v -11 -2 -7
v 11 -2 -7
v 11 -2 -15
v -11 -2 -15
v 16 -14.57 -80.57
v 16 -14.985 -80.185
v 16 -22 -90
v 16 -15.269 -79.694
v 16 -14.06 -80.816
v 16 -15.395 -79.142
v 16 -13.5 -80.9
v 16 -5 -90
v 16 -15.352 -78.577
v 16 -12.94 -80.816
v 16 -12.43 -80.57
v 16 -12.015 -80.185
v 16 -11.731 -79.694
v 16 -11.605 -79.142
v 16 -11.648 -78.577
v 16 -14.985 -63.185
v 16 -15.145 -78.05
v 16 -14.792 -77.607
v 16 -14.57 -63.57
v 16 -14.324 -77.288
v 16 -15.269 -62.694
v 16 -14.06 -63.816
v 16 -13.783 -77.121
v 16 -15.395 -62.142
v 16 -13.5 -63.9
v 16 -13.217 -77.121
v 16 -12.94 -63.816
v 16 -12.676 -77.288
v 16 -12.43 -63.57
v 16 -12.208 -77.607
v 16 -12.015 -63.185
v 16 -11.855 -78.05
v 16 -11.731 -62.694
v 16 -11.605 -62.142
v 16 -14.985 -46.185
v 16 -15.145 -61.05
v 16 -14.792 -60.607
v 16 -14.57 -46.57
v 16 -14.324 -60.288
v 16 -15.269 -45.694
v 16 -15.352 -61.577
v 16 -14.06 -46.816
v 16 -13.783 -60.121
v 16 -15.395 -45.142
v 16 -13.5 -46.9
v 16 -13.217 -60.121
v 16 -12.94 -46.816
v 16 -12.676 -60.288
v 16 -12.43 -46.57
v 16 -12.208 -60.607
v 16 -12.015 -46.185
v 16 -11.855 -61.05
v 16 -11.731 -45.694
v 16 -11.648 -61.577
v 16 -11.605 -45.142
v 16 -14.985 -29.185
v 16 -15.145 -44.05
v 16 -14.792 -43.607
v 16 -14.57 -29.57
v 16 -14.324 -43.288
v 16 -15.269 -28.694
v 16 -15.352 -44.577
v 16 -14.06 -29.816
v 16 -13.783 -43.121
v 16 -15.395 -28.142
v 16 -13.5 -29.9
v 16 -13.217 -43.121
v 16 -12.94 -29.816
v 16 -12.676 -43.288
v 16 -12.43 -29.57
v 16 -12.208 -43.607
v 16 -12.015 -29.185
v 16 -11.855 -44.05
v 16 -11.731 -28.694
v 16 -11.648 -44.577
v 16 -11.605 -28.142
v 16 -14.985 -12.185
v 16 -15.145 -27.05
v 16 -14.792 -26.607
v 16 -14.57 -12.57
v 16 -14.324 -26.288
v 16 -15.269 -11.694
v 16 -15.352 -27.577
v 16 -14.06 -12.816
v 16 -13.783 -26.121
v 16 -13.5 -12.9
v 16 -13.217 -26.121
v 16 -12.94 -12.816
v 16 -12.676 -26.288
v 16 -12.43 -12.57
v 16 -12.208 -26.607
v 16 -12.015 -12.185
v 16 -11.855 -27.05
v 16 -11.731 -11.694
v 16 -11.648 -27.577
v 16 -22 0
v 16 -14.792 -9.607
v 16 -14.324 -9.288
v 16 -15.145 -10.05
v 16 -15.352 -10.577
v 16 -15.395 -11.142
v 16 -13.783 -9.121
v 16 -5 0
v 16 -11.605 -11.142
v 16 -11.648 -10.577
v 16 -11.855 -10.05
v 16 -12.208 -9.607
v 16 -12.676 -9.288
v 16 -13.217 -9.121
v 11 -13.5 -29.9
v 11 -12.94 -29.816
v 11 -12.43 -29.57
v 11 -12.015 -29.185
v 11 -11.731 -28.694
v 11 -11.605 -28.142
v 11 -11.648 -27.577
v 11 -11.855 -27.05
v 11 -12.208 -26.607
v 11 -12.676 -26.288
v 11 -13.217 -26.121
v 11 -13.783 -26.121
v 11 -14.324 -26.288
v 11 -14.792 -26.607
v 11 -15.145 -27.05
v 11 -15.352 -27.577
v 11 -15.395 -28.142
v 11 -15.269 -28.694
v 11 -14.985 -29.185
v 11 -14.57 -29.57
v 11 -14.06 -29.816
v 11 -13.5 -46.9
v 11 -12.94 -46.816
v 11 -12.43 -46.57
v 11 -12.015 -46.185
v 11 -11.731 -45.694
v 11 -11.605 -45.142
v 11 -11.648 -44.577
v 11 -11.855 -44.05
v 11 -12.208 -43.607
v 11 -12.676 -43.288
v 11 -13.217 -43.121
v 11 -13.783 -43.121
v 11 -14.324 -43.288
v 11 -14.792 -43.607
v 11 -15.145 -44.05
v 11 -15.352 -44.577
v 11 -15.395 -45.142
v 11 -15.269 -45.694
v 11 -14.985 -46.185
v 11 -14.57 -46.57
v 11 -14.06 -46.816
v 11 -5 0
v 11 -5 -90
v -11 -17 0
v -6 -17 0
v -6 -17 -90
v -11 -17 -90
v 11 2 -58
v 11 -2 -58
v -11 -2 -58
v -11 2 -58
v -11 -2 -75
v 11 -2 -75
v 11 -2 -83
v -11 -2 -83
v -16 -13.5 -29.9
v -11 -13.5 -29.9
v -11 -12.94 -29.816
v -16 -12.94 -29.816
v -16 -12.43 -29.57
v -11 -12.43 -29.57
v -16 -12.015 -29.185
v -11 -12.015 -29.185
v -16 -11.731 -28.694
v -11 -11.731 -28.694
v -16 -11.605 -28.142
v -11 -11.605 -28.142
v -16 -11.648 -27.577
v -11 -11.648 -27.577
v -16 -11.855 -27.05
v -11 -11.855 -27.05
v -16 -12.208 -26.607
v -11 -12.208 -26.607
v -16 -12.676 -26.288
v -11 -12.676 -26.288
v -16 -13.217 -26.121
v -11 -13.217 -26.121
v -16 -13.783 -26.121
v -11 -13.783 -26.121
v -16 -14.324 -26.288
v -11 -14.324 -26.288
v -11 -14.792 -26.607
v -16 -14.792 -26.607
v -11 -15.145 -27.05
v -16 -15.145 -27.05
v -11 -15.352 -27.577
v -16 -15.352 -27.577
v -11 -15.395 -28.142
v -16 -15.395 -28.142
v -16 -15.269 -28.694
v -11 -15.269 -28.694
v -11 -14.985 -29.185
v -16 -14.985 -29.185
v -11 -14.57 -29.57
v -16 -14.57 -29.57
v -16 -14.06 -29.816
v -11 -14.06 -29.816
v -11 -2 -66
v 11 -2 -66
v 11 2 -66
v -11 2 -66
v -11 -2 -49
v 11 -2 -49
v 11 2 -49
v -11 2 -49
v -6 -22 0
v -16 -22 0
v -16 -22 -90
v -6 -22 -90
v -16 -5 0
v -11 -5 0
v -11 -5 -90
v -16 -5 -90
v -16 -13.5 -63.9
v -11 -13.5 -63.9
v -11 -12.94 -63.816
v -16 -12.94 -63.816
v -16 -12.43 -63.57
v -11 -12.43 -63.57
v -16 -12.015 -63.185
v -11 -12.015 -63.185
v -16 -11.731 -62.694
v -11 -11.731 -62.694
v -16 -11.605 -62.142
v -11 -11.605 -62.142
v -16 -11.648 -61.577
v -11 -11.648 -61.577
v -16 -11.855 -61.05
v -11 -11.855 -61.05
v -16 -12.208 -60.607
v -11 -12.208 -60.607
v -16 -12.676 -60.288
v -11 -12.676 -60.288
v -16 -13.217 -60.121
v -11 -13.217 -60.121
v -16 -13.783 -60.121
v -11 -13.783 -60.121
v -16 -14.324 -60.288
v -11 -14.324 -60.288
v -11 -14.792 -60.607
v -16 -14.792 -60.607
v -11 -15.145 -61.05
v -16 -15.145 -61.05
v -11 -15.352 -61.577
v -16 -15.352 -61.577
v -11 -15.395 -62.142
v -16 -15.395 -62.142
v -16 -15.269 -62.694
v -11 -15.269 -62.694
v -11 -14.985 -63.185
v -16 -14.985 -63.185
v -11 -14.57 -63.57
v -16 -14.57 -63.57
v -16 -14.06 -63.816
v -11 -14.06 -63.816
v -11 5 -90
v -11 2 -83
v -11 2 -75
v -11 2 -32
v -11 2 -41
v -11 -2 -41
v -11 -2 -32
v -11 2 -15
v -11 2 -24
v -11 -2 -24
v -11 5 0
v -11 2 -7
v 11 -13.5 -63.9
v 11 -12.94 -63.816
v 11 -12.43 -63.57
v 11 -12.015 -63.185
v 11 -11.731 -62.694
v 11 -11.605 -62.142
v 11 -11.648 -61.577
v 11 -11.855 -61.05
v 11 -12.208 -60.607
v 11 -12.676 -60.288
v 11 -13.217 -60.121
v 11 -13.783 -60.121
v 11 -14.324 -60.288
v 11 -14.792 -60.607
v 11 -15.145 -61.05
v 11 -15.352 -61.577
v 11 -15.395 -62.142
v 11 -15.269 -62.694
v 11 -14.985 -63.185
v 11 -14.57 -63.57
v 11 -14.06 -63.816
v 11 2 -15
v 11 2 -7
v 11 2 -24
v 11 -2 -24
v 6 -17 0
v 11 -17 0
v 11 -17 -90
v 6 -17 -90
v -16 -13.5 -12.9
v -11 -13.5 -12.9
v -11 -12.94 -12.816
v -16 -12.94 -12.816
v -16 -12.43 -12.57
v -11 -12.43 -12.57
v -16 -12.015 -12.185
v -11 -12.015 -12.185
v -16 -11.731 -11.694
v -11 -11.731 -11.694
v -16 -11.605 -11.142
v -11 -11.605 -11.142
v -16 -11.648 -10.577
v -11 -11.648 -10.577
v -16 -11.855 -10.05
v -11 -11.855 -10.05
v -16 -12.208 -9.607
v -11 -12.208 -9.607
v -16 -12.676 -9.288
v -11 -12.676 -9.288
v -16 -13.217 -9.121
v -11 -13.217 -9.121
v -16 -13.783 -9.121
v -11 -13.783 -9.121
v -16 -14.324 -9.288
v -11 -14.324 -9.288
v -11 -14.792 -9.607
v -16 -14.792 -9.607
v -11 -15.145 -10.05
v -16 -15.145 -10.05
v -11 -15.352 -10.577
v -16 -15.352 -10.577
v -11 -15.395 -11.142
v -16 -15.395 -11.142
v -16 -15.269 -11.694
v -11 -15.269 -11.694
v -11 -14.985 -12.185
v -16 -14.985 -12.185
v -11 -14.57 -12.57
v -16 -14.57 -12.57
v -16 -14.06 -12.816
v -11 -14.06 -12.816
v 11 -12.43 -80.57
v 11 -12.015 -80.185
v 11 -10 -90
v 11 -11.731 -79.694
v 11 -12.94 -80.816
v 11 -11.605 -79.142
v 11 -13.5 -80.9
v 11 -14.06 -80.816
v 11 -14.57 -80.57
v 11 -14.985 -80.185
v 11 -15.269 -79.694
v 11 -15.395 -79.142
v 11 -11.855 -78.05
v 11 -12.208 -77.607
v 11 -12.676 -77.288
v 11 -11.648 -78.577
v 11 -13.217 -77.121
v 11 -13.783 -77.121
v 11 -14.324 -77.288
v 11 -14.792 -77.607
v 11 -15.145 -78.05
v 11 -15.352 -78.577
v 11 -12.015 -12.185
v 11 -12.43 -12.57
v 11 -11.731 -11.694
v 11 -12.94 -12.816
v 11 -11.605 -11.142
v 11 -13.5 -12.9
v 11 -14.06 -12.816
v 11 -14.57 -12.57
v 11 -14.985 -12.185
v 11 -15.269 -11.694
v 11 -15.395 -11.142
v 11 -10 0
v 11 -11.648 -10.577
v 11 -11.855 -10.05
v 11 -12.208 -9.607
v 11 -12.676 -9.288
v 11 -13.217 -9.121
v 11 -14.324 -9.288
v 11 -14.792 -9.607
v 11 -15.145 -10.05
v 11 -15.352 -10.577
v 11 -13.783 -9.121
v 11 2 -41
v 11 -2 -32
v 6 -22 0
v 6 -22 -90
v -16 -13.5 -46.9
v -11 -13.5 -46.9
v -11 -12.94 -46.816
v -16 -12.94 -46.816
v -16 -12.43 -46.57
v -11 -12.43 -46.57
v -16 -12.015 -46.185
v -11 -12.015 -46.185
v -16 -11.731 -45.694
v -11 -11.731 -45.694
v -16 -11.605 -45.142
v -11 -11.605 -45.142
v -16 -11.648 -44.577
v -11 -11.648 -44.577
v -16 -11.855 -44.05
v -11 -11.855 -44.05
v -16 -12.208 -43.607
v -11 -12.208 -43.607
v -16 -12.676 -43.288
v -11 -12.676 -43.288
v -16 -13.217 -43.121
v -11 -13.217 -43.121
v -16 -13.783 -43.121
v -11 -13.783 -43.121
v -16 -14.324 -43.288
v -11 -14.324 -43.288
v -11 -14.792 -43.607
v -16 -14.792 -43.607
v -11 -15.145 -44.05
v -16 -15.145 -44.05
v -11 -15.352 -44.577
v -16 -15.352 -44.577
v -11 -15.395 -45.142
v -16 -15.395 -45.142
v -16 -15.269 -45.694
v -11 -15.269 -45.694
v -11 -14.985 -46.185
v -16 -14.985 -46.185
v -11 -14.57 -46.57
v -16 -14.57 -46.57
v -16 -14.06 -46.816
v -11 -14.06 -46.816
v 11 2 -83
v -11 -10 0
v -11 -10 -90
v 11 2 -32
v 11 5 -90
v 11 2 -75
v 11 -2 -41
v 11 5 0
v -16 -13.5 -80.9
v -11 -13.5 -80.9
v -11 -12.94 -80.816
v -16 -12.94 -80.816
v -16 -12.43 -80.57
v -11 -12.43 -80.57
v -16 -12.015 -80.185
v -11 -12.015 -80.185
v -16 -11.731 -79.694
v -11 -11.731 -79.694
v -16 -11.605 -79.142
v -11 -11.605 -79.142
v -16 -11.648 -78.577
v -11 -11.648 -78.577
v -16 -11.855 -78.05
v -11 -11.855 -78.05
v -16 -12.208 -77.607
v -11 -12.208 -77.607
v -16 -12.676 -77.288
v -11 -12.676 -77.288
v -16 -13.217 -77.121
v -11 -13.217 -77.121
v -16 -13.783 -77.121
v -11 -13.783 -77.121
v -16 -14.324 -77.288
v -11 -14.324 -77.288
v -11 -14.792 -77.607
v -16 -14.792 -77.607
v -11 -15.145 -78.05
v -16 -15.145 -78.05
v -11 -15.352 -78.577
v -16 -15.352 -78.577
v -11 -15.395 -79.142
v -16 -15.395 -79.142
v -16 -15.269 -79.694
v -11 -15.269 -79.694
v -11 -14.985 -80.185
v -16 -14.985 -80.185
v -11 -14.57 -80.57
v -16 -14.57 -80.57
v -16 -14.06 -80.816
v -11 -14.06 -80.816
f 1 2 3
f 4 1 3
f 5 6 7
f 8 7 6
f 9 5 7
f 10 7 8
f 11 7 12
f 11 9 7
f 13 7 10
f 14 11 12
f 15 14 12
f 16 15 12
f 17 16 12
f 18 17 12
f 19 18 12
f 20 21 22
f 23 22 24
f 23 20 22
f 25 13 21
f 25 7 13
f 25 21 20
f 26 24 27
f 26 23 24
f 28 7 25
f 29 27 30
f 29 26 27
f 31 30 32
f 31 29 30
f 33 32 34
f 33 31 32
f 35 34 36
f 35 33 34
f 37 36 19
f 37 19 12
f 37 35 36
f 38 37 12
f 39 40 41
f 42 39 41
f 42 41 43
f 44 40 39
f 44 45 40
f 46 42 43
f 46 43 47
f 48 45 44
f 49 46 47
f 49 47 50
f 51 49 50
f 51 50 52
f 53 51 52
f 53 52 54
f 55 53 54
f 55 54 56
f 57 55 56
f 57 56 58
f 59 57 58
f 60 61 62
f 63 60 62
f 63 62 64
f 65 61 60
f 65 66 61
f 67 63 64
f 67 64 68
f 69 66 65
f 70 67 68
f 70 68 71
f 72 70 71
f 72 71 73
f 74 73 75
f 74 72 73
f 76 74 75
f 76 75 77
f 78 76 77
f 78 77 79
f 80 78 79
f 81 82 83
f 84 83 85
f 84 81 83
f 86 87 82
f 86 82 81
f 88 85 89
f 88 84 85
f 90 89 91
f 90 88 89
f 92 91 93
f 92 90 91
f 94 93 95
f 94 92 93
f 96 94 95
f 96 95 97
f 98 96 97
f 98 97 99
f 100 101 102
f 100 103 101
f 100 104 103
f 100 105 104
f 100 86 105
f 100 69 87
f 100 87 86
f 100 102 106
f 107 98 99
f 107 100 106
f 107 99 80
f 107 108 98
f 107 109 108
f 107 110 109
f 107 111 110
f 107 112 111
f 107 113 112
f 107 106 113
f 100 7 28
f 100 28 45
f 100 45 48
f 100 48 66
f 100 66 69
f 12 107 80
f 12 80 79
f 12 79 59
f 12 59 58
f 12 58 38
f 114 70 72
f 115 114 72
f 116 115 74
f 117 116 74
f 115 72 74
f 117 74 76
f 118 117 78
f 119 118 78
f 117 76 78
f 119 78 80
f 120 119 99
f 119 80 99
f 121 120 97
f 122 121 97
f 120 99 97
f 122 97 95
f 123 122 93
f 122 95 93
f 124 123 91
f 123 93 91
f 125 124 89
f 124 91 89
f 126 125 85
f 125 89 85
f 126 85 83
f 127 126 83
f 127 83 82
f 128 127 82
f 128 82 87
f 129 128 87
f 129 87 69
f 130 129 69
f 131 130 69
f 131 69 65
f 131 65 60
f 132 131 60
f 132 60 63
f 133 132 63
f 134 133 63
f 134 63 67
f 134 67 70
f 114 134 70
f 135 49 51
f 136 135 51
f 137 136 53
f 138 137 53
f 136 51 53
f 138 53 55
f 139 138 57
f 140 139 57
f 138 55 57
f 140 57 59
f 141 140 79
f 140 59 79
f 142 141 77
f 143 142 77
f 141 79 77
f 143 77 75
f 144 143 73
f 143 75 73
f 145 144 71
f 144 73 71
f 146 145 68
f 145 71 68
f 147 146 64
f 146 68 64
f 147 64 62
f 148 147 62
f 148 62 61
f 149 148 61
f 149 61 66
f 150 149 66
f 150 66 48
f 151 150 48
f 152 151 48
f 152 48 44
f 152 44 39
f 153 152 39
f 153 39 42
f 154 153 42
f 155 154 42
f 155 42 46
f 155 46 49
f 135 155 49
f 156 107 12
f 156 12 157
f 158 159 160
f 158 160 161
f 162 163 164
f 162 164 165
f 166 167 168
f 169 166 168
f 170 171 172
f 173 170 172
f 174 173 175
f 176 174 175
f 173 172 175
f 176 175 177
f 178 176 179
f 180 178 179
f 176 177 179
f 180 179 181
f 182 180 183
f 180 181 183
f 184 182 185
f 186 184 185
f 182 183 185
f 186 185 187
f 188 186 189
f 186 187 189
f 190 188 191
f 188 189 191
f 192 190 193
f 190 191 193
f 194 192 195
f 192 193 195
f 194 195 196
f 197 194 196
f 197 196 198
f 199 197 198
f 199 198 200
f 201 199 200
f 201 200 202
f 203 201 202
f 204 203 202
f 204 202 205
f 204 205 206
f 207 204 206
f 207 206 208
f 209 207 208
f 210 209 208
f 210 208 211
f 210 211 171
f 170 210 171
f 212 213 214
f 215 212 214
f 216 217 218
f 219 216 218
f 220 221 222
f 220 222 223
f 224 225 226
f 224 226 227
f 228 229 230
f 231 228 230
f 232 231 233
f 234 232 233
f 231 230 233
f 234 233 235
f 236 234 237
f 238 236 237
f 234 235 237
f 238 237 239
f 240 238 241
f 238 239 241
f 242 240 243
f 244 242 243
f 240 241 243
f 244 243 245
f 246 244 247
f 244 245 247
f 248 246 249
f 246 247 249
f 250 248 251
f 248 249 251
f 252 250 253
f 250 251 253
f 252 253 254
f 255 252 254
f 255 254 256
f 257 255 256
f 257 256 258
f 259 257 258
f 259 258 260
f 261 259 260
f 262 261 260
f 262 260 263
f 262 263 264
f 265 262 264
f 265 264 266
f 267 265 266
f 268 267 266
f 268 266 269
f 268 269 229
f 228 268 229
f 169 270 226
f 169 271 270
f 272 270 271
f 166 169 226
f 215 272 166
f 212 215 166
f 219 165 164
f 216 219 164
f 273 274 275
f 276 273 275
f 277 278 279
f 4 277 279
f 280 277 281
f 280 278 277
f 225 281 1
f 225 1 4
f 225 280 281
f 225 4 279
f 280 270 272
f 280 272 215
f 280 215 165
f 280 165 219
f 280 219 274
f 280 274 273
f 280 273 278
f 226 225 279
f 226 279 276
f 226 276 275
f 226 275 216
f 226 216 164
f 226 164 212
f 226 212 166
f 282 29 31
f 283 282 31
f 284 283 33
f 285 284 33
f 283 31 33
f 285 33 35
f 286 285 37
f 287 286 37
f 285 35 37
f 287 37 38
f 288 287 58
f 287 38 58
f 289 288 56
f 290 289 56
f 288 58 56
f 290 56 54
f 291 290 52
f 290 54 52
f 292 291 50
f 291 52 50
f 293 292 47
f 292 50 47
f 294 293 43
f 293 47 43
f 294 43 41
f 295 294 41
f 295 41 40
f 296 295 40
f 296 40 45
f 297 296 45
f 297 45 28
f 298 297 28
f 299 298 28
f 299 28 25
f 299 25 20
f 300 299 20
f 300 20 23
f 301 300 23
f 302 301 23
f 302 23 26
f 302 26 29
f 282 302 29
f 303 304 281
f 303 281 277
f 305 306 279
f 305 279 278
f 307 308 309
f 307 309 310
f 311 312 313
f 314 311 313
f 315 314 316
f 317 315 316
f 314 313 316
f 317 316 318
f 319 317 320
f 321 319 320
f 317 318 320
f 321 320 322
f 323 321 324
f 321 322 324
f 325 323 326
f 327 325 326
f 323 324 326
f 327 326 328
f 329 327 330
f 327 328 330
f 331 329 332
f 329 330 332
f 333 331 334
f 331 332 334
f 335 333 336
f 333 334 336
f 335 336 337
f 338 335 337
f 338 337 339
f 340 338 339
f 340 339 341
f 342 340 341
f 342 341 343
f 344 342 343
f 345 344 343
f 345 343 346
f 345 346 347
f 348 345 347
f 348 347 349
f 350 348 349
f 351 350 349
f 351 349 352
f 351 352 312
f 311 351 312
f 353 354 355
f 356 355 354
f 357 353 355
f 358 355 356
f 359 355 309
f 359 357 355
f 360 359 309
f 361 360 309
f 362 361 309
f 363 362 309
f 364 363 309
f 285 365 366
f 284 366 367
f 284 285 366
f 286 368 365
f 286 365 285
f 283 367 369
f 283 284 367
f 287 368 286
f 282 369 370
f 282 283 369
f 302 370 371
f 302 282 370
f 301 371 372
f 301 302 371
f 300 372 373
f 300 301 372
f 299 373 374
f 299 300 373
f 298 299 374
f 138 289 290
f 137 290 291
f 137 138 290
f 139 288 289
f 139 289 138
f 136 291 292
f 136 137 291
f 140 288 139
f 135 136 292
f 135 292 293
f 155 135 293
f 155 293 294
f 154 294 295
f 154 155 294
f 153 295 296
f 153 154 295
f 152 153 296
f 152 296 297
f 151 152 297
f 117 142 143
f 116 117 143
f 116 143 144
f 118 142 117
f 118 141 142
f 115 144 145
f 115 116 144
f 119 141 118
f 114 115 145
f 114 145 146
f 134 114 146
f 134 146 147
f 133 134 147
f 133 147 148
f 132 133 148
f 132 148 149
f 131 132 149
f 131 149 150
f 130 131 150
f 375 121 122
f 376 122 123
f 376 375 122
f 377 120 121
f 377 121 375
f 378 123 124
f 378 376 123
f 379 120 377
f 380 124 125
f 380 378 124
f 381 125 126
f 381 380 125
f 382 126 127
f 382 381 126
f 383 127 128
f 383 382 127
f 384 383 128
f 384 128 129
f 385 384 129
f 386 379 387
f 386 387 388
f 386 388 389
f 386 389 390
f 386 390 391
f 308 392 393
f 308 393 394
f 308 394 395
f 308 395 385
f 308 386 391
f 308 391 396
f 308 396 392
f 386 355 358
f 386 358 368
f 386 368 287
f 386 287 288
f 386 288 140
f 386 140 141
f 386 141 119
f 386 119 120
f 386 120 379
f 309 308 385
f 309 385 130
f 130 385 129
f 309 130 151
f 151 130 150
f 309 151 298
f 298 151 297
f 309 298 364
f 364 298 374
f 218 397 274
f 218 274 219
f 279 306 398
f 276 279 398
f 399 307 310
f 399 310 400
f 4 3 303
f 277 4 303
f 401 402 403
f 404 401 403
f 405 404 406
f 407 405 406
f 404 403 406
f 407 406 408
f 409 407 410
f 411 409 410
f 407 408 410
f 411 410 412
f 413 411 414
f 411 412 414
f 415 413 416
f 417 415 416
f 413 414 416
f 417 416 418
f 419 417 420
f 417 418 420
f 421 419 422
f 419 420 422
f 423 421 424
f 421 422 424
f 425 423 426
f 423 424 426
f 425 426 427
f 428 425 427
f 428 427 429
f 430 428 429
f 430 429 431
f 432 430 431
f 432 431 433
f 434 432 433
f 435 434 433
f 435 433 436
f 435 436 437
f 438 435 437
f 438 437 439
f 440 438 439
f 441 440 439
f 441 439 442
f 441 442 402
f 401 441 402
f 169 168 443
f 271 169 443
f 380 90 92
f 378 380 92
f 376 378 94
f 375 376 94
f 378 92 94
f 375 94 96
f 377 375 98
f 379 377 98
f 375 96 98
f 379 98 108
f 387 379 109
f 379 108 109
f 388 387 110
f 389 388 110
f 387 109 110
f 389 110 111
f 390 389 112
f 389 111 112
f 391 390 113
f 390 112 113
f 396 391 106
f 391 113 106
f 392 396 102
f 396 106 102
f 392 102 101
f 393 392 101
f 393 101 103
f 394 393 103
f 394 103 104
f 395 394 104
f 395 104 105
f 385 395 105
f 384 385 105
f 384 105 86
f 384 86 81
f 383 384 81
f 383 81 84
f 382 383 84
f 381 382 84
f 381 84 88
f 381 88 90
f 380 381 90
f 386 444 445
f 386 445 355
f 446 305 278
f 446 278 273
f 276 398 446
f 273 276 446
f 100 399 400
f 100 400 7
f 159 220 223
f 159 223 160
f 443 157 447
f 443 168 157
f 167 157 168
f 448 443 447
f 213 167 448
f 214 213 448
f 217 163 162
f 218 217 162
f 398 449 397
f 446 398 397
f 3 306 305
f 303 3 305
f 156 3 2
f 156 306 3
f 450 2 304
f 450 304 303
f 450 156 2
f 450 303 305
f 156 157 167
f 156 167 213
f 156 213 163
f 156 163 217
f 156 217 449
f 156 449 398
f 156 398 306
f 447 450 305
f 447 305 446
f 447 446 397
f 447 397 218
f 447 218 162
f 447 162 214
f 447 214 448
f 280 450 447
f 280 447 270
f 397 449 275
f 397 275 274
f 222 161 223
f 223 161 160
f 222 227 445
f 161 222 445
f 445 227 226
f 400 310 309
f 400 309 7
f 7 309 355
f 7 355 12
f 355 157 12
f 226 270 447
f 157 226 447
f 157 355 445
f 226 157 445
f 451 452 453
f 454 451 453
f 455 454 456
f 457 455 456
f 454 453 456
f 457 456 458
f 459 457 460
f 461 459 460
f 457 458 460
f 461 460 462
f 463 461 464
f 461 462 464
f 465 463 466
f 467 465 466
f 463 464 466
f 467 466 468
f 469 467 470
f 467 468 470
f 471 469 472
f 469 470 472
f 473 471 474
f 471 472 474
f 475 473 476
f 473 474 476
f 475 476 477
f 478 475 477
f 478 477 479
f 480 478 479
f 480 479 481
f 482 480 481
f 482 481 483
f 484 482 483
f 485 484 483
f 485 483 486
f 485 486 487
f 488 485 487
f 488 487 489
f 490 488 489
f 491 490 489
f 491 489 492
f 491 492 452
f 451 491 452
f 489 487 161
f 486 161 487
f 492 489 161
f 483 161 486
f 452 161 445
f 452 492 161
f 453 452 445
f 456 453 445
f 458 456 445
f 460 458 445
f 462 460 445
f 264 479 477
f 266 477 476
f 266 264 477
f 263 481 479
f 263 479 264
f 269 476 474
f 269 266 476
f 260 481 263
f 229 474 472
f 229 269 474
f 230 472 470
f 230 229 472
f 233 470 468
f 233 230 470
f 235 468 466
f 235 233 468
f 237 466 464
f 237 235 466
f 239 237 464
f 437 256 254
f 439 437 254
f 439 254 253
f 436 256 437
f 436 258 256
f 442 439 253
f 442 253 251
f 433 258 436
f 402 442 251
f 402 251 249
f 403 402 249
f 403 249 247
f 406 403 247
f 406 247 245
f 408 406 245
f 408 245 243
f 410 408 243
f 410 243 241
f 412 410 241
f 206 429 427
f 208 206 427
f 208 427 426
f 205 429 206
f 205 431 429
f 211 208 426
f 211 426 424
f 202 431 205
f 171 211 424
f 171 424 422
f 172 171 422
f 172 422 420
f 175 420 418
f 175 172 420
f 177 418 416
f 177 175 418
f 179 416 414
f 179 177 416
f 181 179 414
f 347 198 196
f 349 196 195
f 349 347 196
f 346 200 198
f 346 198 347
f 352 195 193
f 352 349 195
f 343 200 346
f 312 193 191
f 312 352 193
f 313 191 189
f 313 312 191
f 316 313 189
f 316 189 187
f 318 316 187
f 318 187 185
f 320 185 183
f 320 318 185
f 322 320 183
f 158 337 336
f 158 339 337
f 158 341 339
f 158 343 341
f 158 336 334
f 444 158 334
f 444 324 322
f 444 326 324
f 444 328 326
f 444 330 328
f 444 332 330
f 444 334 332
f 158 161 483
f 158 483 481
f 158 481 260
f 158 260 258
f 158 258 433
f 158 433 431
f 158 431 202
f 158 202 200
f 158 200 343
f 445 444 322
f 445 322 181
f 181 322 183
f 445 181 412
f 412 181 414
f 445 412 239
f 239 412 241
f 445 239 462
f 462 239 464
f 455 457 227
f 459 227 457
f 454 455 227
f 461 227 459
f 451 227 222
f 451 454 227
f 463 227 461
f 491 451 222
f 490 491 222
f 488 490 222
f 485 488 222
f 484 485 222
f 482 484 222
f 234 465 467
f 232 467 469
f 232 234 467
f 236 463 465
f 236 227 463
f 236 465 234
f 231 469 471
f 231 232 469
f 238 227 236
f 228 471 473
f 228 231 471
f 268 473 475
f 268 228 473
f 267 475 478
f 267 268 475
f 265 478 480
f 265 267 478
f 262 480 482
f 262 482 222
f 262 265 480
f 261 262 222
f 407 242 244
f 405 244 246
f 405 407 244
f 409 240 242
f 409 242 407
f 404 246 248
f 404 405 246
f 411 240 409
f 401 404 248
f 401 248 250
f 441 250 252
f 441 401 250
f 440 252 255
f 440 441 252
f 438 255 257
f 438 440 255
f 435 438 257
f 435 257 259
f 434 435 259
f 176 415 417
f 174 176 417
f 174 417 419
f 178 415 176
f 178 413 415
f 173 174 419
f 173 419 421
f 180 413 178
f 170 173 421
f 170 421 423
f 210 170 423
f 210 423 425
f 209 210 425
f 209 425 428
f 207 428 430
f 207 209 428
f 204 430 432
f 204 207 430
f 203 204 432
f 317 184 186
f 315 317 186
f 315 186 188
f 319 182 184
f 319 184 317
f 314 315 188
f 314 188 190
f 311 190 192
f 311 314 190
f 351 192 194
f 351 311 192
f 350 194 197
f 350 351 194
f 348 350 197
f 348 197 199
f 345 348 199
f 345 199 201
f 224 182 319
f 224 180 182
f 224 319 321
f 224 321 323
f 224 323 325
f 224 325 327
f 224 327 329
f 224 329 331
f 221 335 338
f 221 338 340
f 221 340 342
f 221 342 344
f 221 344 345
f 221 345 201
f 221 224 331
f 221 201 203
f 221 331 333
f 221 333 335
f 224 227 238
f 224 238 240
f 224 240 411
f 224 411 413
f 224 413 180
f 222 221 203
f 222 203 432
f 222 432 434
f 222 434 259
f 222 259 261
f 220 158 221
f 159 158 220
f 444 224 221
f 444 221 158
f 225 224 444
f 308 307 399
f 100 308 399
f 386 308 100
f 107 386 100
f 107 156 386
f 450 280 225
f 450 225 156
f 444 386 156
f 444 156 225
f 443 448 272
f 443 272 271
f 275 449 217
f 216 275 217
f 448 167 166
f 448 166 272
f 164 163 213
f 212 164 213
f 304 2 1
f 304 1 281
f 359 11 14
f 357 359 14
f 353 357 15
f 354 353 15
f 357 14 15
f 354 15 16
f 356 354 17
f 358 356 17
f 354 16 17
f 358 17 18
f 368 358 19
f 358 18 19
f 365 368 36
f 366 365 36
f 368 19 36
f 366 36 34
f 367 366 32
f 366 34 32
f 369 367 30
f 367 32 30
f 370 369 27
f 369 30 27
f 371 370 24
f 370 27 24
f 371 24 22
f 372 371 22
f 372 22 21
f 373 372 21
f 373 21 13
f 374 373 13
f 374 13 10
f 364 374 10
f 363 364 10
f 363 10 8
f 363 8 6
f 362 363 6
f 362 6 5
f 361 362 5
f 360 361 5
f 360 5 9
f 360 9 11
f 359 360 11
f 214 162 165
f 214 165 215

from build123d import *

# Parameters (mm, degrees)
BOSS_EXTRUDE1_DEPTH = 90
SKETCH2_R           = 1.9
CUT_EXTRUDE1_DEPTH  = 99.020406039
SKETCH3_W           = 8
SKETCH3_H           = 4
CUT_EXTRUDE2_DEPTH  = 97.503885932


with BuildPart() as part:
    # Sketch1 → Boss-Extrude1 (new body)
    with BuildSketch(Plane.XY):
        Polygon((11, 5), (-11, 5), (-11, -5), (-16, -5), (-16, -22), (-6, -22), (-6, -17), (-11, -17), (-11, -10), (11, -10), (11, -17), (6, -17), (6, -22), (16, -22), (16, -5), (11, -5), align=None)
    extrude(amount=-BOSS_EXTRUDE1_DEPTH)

    # Sketch2 → Cut-Extrude1 (cut, through all)
    with BuildSketch(Plane(origin=(16, 0, 0), x_dir=(0, 0, -1), z_dir=(1, 0, 0))):
        with Locations((45, -13.5)):
            Circle(SKETCH2_R)
        with Locations((62, -13.5)):
            Circle(SKETCH2_R)
        with Locations((79, -13.5)):
            Circle(SKETCH2_R)
        with Locations((28, -13.5)):
            Circle(SKETCH2_R)
        with Locations((11, -13.5)):
            Circle(SKETCH2_R)
    extrude(amount=-CUT_EXTRUDE1_DEPTH, mode=Mode.SUBTRACT)

    # Sketch3 → Cut-Extrude2 (cut, through all)
    with BuildSketch(Plane(origin=(11, 0, 0), x_dir=(0, 0, -1), z_dir=(1, 0, 0))):
        with Locations((62, 0)):
            Rectangle(SKETCH3_W, SKETCH3_H)
        with Locations((45, 0)):
            Rectangle(SKETCH3_W, SKETCH3_H)
        with Locations((79, 0)):
            Rectangle(SKETCH3_W, SKETCH3_H)
        with Locations((28, 0)):
            Rectangle(SKETCH3_W, SKETCH3_H)
        with Locations((11, 0)):
            Rectangle(SKETCH3_W, SKETCH3_H)
    extrude(amount=-CUT_EXTRUDE2_DEPTH, mode=Mode.SUBTRACT)


solid = part.part
